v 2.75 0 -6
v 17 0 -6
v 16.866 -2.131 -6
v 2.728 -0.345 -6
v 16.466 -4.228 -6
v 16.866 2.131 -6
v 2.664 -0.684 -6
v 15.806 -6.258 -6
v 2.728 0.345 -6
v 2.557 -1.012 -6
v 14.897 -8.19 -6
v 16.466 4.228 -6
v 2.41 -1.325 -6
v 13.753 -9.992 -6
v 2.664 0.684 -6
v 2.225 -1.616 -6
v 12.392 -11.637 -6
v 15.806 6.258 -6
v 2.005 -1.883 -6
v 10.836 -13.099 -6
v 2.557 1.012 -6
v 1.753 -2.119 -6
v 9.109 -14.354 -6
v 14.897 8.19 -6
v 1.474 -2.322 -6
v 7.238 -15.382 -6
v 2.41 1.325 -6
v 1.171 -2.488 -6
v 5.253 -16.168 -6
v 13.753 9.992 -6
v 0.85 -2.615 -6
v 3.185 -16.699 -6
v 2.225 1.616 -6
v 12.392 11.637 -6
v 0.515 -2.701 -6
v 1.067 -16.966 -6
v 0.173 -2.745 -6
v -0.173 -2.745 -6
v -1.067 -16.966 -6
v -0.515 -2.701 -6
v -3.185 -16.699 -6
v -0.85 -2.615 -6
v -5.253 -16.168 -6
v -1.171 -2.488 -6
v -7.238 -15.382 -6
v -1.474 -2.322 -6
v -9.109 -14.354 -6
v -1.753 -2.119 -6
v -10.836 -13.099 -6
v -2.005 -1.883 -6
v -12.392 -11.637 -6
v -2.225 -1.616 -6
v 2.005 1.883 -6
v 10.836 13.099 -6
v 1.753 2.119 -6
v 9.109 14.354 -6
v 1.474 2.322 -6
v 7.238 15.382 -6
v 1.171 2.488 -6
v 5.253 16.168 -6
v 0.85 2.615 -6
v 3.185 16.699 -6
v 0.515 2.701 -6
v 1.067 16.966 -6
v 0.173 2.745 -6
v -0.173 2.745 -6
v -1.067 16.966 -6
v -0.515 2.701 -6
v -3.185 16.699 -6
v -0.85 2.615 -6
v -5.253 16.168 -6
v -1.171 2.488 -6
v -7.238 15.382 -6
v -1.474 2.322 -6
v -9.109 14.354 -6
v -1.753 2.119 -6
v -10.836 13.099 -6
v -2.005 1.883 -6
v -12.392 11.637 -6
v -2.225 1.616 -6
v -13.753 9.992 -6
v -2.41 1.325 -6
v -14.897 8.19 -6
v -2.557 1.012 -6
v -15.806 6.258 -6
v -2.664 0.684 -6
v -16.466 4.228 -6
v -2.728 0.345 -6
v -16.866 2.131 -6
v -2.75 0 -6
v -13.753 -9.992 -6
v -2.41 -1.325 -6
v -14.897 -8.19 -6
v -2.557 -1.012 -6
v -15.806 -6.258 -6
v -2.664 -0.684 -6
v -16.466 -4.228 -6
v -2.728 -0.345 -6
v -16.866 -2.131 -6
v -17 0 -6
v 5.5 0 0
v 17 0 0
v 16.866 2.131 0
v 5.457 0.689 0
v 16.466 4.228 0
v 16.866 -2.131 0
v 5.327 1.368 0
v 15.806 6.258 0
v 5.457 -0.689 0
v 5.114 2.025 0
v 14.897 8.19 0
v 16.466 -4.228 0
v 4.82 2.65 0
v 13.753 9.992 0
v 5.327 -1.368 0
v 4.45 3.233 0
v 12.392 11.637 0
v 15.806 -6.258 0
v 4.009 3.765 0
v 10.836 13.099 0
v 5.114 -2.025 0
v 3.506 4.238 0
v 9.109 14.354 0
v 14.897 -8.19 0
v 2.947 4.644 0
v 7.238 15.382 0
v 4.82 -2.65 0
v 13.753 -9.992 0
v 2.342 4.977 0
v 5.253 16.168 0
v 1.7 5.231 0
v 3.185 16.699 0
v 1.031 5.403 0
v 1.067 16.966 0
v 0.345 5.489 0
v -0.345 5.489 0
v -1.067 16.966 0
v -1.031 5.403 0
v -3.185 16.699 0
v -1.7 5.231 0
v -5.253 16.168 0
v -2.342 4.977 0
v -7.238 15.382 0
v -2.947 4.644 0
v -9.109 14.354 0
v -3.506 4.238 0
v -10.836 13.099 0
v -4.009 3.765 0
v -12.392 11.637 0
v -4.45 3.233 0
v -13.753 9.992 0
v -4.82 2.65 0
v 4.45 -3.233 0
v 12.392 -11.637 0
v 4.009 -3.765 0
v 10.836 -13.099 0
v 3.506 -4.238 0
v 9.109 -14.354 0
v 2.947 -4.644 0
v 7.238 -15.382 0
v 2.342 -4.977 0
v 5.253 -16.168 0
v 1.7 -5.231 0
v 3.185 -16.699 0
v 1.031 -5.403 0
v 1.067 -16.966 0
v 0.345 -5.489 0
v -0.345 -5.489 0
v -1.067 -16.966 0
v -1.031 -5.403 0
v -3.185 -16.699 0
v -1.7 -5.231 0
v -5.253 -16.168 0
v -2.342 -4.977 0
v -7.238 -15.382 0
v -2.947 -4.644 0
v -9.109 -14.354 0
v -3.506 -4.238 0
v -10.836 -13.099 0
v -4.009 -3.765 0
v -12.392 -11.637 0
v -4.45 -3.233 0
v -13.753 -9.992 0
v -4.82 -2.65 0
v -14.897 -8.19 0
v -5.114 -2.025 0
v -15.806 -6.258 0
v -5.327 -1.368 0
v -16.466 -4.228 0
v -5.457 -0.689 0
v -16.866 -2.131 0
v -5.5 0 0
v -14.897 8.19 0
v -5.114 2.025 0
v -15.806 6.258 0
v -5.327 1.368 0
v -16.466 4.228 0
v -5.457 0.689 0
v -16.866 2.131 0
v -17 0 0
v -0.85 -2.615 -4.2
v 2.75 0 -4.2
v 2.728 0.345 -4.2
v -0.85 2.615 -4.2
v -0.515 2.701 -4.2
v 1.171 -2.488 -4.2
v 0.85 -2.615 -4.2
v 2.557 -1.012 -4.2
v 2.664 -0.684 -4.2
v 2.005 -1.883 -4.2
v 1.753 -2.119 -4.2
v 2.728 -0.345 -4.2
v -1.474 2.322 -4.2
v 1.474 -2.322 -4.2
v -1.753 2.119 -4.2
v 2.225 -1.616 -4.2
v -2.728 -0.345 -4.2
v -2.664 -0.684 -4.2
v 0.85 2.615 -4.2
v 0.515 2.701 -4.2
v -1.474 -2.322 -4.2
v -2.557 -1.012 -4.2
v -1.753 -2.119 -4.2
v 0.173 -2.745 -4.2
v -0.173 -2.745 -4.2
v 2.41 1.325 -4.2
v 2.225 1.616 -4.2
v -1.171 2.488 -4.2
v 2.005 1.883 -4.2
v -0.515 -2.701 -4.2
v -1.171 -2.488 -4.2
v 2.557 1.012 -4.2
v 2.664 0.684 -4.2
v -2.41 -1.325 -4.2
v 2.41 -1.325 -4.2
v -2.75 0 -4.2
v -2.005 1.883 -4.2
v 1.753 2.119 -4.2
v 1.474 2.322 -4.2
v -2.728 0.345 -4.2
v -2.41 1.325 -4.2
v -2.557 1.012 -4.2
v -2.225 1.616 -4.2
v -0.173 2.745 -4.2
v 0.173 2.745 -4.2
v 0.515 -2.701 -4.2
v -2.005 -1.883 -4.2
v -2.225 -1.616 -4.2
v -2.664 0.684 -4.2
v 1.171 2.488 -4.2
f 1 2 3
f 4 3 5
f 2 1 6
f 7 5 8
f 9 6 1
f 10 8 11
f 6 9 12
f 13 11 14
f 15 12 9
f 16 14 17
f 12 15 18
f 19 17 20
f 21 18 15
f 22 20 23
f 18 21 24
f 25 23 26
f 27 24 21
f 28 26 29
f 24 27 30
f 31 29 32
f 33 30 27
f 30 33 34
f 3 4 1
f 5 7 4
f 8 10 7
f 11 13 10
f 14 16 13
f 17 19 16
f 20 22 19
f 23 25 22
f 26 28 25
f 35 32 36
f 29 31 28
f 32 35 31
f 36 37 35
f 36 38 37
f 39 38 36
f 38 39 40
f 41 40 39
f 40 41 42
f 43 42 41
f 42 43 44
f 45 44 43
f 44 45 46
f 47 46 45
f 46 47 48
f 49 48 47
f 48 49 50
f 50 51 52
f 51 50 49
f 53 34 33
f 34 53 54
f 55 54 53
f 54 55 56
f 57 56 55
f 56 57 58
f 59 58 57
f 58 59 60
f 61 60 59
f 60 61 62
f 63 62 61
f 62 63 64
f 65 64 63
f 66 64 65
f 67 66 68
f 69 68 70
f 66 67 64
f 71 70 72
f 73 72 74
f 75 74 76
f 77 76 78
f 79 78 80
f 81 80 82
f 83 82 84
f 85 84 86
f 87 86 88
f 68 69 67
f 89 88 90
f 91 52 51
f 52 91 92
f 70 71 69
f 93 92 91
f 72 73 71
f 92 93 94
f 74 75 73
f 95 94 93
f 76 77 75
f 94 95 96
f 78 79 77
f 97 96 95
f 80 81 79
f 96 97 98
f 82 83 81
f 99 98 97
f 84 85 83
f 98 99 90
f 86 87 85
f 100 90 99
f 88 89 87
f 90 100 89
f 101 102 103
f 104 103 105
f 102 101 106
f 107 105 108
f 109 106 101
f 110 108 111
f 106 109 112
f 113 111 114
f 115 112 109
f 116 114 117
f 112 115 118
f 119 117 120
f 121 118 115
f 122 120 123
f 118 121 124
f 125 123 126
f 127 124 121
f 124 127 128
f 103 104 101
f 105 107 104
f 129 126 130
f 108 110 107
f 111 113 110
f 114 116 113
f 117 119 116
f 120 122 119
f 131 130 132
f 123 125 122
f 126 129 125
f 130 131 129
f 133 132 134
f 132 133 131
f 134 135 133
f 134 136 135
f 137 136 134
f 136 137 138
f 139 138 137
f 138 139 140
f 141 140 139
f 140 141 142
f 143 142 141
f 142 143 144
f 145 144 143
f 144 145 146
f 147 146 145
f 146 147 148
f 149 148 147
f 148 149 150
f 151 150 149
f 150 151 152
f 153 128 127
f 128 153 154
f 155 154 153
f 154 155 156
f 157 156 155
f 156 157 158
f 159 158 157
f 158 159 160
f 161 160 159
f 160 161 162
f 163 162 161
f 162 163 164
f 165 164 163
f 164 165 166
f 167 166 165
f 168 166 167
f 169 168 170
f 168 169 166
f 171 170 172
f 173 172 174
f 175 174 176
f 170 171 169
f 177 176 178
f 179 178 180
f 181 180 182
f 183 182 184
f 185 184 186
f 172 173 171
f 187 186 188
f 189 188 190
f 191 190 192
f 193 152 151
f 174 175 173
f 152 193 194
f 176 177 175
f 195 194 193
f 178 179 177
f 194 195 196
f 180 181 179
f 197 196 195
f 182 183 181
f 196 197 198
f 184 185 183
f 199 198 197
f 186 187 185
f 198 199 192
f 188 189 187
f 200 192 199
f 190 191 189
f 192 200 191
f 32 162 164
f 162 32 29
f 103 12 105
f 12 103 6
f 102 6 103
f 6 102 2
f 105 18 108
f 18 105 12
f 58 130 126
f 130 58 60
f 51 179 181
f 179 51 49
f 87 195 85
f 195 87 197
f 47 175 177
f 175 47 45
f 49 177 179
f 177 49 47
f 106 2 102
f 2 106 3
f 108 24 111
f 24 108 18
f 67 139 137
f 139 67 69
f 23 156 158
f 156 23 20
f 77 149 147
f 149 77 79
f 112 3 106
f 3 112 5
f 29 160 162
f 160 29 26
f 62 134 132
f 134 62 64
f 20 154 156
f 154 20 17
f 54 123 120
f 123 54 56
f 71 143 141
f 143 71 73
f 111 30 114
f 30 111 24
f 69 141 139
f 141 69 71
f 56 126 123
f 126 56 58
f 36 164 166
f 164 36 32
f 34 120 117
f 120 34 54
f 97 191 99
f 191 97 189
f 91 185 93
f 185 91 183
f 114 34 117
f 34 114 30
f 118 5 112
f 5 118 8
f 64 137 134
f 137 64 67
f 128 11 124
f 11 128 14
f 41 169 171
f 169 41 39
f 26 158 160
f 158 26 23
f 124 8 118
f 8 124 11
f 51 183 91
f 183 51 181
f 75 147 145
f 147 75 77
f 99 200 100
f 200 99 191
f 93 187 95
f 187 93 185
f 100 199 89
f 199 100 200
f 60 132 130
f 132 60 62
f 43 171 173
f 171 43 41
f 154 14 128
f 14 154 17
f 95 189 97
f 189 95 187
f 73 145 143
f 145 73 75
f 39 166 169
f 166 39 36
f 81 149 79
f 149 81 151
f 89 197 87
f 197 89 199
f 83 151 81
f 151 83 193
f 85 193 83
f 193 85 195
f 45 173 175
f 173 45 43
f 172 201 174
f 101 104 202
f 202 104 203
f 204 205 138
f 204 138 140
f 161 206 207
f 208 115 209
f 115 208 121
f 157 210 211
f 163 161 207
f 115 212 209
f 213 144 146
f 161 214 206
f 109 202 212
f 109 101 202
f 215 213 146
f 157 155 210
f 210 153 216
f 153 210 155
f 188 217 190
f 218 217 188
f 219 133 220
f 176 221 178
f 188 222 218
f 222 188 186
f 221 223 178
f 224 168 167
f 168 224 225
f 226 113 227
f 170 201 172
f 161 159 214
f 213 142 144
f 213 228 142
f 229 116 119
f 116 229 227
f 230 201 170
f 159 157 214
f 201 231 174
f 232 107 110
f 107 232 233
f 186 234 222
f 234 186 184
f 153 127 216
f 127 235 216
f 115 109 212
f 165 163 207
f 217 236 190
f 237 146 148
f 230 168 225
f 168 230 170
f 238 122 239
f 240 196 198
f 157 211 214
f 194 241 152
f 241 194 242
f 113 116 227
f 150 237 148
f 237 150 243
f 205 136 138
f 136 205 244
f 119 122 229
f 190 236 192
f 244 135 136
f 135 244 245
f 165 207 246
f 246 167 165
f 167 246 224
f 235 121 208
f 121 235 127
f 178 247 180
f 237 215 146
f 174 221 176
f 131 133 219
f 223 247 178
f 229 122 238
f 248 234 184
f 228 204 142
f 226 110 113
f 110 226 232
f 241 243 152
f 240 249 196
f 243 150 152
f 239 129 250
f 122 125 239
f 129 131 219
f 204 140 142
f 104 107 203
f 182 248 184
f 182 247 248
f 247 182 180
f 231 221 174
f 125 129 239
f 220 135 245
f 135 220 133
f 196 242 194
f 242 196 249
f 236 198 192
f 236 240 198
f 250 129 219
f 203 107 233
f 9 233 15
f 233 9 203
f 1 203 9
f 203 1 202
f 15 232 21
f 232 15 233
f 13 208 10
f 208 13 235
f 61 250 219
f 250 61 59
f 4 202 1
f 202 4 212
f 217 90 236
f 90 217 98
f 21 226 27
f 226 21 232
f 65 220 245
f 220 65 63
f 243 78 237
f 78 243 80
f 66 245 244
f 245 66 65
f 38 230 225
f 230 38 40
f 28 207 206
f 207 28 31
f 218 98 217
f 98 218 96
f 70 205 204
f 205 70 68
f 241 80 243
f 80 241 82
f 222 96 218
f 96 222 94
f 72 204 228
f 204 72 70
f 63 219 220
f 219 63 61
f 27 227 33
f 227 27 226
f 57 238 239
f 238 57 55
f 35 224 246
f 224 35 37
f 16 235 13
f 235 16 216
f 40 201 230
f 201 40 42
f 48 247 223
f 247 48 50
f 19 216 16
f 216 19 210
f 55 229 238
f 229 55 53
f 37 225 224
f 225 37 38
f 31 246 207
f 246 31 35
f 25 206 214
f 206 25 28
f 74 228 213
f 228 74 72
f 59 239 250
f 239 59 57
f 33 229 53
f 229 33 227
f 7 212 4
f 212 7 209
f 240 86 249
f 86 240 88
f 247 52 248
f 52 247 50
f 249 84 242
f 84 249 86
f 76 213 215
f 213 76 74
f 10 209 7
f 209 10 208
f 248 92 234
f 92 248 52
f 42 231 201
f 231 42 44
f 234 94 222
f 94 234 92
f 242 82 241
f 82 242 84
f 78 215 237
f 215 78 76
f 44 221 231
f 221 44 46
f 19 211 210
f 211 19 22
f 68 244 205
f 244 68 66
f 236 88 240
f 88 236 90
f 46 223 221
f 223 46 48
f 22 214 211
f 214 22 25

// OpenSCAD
$fn = 50;


difference() {
	union() {
		translate(v = [0, 0, -6.0000000000]) {
			cylinder(h = 6, r = 7.0000000000);
		}
		translate(v = [0, 0, -6.0000000000]) {
			cylinder(h = 6, r = 17.0000000000);
		}
	}
	union() {
		translate(v = [0, 0, 0]) {
			rotate(a = [0, 0, 0]) {
				difference() {
					union() {
						#translate(v = [0, 0, -6.0000000000]) {
							cylinder(h = 6, r = 2.2500000000);
						}
						#translate(v = [0, 0, -4.2000000000]) {
							cylinder(h = 4.2000000000, r = 7.0000000000, r1 = 2.7500000000, r2 = 5.5000000000);
						}
						#translate(v = [0, 0, -6.0000000000]) {
							cylinder(h = 6, r = 2.7500000000);
						}
						#translate(v = [0, 0, -6.0000000000]) {
							cylinder(h = 6, r = 2.2500000000);
						}
					}
					union();
				}
			}
		}
	}
}
